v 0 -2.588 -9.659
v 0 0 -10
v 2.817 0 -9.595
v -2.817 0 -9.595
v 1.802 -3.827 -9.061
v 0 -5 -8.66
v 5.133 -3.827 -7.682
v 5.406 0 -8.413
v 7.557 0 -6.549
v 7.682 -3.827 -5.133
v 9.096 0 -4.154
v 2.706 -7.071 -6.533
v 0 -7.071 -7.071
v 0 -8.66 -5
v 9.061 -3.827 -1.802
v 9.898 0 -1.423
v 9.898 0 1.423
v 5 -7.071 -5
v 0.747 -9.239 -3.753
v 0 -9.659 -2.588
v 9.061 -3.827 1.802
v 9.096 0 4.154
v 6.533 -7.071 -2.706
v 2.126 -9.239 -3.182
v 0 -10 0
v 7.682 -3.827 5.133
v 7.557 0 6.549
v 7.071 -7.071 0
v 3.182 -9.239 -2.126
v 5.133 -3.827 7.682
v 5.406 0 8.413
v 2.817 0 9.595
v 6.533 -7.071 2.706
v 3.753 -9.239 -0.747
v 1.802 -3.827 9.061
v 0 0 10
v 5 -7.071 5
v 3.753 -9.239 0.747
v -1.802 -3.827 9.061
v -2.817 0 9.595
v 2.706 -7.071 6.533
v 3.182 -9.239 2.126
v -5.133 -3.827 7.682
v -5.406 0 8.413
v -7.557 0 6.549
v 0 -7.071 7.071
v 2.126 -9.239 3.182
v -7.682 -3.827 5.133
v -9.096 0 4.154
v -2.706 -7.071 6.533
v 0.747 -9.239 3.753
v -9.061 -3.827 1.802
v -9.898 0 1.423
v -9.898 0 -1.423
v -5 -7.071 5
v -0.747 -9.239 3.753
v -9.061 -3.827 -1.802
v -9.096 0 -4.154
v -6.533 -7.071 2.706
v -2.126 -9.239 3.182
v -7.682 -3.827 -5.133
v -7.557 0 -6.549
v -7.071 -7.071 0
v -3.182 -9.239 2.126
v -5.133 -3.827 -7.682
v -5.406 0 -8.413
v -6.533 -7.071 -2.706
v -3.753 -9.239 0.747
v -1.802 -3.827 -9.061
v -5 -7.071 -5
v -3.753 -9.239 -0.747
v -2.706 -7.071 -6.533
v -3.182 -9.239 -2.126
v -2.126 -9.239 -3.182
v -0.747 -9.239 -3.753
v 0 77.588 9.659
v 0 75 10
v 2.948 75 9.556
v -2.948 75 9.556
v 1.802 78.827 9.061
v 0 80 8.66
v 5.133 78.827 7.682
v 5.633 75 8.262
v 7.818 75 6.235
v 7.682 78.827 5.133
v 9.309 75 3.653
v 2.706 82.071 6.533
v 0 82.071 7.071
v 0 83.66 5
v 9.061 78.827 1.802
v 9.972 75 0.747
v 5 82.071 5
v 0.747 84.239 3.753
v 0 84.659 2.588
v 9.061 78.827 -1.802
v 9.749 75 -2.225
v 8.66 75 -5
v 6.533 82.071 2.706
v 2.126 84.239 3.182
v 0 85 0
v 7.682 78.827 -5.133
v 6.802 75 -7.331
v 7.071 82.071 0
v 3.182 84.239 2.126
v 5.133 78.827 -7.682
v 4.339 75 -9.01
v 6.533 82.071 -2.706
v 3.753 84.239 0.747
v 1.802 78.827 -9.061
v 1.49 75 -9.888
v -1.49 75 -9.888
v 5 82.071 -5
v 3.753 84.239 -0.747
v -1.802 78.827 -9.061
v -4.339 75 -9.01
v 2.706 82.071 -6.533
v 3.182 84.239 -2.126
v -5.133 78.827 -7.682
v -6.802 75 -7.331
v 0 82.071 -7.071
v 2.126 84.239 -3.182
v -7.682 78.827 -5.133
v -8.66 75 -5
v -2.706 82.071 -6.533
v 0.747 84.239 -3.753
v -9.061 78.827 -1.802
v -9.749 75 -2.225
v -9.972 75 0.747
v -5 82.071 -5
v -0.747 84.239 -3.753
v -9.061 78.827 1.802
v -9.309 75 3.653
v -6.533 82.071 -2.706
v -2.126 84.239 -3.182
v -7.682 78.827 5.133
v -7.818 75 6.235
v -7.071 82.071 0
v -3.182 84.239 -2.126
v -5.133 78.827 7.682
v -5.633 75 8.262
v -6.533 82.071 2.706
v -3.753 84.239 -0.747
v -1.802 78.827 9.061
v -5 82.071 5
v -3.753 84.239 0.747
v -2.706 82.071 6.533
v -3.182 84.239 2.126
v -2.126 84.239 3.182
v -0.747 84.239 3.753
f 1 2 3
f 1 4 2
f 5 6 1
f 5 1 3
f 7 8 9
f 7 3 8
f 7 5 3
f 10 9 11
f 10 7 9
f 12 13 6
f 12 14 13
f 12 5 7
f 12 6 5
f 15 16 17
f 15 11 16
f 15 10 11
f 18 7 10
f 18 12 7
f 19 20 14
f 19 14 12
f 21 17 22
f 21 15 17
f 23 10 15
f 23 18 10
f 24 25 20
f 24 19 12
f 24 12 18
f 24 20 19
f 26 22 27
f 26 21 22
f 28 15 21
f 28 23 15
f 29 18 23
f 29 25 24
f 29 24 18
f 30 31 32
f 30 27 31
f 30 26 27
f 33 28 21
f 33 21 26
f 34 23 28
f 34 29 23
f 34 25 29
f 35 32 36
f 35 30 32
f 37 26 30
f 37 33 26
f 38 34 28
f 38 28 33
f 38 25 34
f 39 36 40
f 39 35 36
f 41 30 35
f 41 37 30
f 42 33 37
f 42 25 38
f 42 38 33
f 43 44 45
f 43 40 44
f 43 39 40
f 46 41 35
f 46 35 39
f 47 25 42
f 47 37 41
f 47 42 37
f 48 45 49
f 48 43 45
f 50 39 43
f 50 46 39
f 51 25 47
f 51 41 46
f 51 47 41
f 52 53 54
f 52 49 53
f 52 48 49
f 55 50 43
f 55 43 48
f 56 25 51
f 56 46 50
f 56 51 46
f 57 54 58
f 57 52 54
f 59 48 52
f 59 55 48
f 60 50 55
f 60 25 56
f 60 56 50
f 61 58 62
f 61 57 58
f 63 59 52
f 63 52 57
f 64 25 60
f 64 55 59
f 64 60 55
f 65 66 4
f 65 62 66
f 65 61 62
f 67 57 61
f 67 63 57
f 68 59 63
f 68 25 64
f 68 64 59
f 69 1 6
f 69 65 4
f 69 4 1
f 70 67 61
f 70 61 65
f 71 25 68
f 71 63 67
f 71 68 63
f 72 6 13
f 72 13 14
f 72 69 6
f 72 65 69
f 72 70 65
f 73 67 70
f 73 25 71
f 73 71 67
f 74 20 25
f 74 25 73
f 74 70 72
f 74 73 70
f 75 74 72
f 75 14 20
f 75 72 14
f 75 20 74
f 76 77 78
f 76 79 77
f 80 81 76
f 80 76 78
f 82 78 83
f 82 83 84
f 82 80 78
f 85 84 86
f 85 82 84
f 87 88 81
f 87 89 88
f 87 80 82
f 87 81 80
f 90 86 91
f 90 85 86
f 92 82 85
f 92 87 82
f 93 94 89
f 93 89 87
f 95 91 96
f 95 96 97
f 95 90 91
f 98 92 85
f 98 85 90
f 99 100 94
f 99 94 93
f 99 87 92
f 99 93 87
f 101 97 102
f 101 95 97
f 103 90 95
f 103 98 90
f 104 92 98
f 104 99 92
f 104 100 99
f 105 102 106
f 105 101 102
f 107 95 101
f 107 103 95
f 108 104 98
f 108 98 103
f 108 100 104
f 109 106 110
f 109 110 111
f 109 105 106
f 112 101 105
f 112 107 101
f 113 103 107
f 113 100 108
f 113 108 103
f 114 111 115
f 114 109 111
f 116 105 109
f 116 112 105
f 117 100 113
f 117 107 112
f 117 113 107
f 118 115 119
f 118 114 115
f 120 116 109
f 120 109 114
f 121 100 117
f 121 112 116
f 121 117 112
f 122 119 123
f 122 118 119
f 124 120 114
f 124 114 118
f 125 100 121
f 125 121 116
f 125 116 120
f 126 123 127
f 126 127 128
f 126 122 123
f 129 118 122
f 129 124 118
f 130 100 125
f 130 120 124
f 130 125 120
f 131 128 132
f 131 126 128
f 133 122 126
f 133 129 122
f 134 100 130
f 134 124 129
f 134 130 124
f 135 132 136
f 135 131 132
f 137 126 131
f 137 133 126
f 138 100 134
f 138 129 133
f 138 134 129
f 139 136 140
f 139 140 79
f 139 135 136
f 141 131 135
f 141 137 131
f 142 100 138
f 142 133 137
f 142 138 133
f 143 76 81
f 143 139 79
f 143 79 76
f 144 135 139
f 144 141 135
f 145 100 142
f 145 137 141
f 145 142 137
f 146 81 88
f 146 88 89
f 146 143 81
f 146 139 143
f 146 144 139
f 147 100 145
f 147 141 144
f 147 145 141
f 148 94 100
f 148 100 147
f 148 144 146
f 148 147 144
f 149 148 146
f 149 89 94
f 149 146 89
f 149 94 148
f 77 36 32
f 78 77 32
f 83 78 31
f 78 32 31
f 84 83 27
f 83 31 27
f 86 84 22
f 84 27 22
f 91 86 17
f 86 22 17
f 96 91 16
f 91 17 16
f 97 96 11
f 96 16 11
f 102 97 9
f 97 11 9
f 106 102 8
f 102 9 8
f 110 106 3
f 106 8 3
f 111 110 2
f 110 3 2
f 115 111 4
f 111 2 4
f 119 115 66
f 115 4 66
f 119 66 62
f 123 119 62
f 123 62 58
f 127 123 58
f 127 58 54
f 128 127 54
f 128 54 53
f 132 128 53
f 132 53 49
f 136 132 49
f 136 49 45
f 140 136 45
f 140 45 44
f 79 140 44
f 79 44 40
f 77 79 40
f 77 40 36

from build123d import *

# Parameters (mm, degrees)
SKETCH1_R           = 10
BOSS_EXTRUDE1_DEPTH = 75
DOME2_FACE_RADIUS   = 10
DOME2_HEIGHT        = 10
DOME3_FACE_RADIUS   = 10
DOME3_HEIGHT        = 10


with BuildPart() as part:
    # Sketch1 → Boss-Extrude1 (new body)
    with BuildSketch(Plane(origin=(0, 0, 0), x_dir=(1, 0, 0), z_dir=(0, 1, 0))):
        with Locations(Location((0, 0, 0), (0, 0, 270))):
            Circle(SKETCH1_R)
    extrude(amount=BOSS_EXTRUDE1_DEPTH)

    # Dome2: a dome of height H over a round flat face of radius A is a cap of a sphere of radius (A * A + H * H) / (2 * H)
    dome2_r = (DOME2_FACE_RADIUS * DOME2_FACE_RADIUS + DOME2_HEIGHT * DOME2_HEIGHT) / (2 * DOME2_HEIGHT)
    dome2_base = Plane((0, 75, 0), z_dir=(0, 1, 0))
    with Locations(dome2_base.offset(DOME2_HEIGHT - dome2_r)):
        dome2_ball = Sphere(dome2_r, mode=Mode.PRIVATE)
    add(split(dome2_ball, bisect_by=dome2_base, keep=Keep.TOP, mode=Mode.PRIVATE))

    # Dome3: a dome of height H over a round flat face of radius A is a cap of a sphere of radius (A * A + H * H) / (2 * H)
    dome3_r = (DOME3_FACE_RADIUS * DOME3_FACE_RADIUS + DOME3_HEIGHT * DOME3_HEIGHT) / (2 * DOME3_HEIGHT)
    dome3_base = Plane((0, 0, 0), z_dir=(0, -1, 0))
    with Locations(dome3_base.offset(DOME3_HEIGHT - dome3_r)):
        dome3_ball = Sphere(dome3_r, mode=Mode.PRIVATE)
    add(split(dome3_ball, bisect_by=dome3_base, keep=Keep.TOP, mode=Mode.PRIVATE))


solid = part.part
